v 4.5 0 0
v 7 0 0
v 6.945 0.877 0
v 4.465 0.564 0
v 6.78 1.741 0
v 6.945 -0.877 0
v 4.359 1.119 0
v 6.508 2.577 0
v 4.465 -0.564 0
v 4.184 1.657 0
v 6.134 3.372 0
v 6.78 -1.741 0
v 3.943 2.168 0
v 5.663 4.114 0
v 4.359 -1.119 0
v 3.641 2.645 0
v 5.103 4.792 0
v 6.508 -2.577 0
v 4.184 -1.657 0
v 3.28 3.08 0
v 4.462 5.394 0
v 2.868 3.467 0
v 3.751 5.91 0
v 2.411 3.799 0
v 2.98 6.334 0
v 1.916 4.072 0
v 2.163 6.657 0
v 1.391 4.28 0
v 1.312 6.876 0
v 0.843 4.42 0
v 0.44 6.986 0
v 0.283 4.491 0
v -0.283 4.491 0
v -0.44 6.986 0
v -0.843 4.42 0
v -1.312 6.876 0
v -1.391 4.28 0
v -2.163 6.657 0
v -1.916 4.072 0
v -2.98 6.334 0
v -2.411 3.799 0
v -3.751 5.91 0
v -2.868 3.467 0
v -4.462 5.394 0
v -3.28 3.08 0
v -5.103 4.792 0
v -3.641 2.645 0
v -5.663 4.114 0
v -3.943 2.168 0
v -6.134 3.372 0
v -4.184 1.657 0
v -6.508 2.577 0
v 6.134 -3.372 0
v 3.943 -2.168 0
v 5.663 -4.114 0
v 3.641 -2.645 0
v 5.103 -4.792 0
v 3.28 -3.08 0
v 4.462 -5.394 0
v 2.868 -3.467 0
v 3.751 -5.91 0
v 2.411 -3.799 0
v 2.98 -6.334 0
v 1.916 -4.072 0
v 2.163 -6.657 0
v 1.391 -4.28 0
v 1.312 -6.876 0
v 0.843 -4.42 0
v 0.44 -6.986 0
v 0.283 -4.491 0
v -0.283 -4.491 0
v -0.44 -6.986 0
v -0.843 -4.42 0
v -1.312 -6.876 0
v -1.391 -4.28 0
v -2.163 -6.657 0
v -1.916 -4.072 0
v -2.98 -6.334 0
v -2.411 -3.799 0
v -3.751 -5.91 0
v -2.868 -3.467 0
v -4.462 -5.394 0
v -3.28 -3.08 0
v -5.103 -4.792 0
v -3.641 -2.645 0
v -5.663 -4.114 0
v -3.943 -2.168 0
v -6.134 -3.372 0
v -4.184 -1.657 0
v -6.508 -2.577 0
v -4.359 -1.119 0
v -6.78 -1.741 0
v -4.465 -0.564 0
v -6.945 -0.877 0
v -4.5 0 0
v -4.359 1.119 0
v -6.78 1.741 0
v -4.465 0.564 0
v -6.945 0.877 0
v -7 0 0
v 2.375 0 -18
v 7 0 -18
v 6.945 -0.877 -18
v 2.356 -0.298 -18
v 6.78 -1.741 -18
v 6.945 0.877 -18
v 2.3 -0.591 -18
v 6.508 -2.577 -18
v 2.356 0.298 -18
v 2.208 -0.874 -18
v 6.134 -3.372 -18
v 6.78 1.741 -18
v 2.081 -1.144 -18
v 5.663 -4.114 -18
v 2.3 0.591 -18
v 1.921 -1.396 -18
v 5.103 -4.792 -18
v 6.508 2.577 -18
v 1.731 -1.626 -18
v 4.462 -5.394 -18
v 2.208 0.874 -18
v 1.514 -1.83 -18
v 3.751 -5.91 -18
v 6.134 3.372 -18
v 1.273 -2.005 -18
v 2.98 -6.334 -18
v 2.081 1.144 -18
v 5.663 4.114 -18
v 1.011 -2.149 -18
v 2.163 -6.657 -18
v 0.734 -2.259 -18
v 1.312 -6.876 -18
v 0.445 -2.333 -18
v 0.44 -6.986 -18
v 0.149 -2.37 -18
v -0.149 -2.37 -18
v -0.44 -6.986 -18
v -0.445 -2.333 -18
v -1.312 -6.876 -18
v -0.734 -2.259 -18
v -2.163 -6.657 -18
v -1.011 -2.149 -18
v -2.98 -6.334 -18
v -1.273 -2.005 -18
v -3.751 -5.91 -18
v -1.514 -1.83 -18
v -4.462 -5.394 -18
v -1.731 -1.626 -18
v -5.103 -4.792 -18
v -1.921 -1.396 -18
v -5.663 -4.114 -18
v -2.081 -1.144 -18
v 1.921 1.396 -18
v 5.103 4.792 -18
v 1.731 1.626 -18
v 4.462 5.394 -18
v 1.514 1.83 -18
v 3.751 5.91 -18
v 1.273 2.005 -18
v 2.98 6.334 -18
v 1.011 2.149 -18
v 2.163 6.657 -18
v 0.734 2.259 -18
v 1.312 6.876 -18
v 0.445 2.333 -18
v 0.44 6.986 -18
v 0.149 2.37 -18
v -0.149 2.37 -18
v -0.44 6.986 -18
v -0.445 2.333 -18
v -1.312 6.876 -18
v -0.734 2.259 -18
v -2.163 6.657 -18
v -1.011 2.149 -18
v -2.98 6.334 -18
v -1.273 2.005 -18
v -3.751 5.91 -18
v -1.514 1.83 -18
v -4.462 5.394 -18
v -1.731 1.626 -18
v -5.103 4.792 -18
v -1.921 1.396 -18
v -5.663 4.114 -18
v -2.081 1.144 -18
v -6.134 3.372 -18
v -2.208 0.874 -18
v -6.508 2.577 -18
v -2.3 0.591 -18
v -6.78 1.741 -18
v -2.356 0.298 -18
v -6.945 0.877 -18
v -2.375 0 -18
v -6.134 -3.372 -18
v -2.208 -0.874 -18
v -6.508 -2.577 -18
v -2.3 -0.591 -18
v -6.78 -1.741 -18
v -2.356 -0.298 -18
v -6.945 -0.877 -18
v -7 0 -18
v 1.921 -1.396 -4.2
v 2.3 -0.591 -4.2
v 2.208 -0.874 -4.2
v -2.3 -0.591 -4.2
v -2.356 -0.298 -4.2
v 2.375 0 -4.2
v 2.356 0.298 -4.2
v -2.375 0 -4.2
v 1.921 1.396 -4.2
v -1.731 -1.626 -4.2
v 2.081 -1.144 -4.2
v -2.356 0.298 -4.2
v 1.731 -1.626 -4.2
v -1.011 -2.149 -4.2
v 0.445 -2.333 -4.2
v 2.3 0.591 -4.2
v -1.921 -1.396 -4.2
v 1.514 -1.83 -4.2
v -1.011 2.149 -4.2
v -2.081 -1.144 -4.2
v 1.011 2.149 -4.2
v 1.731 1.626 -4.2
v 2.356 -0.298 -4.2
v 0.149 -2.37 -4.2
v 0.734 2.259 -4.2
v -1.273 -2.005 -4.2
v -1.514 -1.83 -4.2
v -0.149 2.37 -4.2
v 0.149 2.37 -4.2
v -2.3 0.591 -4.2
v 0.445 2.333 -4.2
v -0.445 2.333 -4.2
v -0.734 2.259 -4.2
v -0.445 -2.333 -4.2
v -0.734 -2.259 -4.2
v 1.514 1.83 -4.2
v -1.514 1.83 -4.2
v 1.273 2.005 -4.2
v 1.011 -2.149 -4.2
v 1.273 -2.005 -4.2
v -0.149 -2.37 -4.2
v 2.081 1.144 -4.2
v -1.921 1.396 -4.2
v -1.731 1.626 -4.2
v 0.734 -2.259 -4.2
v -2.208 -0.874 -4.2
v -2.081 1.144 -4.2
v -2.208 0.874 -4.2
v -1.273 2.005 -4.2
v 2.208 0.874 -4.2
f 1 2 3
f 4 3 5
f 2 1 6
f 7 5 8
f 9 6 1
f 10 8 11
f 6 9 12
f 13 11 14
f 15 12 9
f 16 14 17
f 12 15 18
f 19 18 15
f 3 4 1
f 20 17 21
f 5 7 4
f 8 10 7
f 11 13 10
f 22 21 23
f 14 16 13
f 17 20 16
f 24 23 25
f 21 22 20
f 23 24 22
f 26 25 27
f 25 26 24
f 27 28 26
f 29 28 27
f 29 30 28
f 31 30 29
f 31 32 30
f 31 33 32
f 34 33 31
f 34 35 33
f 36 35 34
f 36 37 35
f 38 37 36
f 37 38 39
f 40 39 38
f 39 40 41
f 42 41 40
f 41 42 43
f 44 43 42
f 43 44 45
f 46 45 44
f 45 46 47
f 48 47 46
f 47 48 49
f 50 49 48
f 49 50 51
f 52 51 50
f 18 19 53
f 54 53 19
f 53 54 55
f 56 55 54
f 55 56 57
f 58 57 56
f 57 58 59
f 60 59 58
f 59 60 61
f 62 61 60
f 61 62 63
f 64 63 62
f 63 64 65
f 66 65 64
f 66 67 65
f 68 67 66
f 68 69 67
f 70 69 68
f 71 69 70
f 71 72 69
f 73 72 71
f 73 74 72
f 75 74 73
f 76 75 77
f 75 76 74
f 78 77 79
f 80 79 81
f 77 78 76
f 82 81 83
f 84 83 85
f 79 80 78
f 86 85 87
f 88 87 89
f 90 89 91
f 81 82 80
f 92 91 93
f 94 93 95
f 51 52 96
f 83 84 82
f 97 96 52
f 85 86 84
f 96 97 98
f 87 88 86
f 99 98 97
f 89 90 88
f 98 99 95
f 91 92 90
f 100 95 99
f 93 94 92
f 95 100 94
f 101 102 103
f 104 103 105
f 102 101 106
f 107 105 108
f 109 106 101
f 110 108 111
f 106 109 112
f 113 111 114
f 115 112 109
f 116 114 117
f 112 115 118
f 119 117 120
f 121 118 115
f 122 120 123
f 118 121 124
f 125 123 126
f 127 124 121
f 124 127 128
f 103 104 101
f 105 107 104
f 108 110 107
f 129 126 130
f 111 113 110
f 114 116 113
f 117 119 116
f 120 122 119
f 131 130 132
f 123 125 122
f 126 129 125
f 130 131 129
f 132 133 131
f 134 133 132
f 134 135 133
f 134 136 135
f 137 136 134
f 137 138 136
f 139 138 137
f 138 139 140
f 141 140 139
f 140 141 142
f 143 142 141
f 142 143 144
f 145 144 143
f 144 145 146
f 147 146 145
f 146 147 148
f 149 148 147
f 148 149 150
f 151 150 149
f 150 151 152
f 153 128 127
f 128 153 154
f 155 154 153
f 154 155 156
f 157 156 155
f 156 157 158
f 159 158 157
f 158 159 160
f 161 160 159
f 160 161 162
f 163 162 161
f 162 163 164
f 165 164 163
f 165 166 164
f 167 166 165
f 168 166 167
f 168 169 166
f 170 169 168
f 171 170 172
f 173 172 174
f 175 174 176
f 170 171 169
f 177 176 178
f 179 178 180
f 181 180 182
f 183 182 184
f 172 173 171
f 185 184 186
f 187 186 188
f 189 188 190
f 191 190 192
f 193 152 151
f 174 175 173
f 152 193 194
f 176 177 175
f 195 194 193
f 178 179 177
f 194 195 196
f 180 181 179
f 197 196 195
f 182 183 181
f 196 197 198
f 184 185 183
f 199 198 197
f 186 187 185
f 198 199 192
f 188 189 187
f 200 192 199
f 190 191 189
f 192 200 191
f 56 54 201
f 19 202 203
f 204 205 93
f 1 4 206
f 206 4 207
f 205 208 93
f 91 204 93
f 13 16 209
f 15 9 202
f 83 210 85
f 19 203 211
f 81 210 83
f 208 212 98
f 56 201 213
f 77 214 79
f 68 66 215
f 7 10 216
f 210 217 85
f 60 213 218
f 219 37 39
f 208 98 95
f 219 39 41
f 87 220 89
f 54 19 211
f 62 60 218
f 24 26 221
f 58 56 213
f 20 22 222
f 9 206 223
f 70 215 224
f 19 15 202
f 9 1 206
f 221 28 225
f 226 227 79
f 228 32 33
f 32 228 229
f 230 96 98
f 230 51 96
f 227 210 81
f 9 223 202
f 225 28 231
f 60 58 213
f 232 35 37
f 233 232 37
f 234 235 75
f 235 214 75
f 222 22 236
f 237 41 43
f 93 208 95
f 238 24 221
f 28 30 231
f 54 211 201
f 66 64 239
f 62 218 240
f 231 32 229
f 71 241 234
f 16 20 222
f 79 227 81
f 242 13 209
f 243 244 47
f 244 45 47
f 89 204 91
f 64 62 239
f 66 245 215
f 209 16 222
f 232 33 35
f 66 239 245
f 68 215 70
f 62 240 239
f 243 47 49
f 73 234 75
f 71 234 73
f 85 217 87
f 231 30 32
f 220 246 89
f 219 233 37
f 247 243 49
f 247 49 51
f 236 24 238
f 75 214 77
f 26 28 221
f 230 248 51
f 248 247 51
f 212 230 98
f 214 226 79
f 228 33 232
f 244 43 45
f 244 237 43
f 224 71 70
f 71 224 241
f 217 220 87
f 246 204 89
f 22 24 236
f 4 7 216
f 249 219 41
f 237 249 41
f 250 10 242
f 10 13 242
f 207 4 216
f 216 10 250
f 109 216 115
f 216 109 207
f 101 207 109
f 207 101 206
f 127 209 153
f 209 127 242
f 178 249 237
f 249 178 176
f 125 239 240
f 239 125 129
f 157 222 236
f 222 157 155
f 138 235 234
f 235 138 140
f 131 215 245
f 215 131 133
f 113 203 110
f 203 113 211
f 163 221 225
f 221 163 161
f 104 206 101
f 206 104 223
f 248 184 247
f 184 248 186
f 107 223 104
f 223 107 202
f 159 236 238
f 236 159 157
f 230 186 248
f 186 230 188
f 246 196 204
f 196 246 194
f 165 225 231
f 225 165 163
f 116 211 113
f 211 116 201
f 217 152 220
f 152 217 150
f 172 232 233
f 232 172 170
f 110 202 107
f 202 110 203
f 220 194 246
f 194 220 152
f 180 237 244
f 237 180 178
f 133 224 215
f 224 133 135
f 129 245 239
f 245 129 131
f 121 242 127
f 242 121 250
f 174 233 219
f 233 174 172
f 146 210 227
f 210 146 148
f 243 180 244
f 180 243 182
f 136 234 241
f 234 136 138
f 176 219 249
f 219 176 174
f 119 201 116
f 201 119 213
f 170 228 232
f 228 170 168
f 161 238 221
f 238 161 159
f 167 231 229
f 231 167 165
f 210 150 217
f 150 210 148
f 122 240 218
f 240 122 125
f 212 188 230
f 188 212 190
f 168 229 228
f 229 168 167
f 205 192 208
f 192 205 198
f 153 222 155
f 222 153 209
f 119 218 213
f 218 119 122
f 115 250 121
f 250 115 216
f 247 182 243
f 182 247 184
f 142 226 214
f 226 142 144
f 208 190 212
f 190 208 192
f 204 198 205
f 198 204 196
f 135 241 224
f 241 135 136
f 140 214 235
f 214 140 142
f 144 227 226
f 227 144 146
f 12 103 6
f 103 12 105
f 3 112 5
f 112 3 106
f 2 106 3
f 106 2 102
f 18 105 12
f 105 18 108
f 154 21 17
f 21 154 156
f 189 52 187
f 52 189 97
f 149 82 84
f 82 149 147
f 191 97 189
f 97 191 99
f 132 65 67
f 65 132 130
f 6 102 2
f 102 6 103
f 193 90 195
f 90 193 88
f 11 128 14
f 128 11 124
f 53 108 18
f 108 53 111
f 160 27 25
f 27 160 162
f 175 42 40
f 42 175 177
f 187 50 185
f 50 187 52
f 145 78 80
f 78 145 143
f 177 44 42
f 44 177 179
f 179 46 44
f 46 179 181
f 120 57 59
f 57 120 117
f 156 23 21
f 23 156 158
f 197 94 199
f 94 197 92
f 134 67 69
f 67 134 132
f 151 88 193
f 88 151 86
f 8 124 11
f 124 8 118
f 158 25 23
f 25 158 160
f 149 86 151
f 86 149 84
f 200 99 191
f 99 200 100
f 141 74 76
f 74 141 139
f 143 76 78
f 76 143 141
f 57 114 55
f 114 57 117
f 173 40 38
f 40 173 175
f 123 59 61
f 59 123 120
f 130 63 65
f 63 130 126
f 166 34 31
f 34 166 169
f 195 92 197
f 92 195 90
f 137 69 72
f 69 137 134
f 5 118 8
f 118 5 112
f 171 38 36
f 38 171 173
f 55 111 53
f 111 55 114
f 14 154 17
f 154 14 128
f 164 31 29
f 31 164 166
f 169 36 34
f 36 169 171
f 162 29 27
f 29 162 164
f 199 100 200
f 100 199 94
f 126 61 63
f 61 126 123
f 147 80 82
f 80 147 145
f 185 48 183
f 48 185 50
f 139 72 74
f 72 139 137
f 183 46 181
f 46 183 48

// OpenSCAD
$fn = 50;


difference() {
	union() {
		translate(v = [0, 0, -18.0000000000]) {
			cylinder(h = 18, r = 7.0000000000);
		}
		cylinder(h = 0, r = 13.0000000000);
	}
	union() {
		translate(v = [0, 0, 0]) {
			rotate(a = [0, 0, 0]) {
				difference() {
					union() {
						#translate(v = [0, 0, -18.0000000000]) {
							cylinder(h = 18, r = 2.2500000000);
						}
						#translate(v = [0, 0, -4.2000000000]) {
							cylinder(h = 4.2000000000, r = 7.0000000000, r1 = 2.3750000000, r2 = 4.5000000000);
						}
						#translate(v = [0, 0, -18.0000000000]) {
							cylinder(h = 18, r = 2.3750000000);
						}
						#translate(v = [0, 0, -18.0000000000]) {
							cylinder(h = 18, r = 2.2500000000);
						}
					}
					union();
				}
			}
		}
	}
}
